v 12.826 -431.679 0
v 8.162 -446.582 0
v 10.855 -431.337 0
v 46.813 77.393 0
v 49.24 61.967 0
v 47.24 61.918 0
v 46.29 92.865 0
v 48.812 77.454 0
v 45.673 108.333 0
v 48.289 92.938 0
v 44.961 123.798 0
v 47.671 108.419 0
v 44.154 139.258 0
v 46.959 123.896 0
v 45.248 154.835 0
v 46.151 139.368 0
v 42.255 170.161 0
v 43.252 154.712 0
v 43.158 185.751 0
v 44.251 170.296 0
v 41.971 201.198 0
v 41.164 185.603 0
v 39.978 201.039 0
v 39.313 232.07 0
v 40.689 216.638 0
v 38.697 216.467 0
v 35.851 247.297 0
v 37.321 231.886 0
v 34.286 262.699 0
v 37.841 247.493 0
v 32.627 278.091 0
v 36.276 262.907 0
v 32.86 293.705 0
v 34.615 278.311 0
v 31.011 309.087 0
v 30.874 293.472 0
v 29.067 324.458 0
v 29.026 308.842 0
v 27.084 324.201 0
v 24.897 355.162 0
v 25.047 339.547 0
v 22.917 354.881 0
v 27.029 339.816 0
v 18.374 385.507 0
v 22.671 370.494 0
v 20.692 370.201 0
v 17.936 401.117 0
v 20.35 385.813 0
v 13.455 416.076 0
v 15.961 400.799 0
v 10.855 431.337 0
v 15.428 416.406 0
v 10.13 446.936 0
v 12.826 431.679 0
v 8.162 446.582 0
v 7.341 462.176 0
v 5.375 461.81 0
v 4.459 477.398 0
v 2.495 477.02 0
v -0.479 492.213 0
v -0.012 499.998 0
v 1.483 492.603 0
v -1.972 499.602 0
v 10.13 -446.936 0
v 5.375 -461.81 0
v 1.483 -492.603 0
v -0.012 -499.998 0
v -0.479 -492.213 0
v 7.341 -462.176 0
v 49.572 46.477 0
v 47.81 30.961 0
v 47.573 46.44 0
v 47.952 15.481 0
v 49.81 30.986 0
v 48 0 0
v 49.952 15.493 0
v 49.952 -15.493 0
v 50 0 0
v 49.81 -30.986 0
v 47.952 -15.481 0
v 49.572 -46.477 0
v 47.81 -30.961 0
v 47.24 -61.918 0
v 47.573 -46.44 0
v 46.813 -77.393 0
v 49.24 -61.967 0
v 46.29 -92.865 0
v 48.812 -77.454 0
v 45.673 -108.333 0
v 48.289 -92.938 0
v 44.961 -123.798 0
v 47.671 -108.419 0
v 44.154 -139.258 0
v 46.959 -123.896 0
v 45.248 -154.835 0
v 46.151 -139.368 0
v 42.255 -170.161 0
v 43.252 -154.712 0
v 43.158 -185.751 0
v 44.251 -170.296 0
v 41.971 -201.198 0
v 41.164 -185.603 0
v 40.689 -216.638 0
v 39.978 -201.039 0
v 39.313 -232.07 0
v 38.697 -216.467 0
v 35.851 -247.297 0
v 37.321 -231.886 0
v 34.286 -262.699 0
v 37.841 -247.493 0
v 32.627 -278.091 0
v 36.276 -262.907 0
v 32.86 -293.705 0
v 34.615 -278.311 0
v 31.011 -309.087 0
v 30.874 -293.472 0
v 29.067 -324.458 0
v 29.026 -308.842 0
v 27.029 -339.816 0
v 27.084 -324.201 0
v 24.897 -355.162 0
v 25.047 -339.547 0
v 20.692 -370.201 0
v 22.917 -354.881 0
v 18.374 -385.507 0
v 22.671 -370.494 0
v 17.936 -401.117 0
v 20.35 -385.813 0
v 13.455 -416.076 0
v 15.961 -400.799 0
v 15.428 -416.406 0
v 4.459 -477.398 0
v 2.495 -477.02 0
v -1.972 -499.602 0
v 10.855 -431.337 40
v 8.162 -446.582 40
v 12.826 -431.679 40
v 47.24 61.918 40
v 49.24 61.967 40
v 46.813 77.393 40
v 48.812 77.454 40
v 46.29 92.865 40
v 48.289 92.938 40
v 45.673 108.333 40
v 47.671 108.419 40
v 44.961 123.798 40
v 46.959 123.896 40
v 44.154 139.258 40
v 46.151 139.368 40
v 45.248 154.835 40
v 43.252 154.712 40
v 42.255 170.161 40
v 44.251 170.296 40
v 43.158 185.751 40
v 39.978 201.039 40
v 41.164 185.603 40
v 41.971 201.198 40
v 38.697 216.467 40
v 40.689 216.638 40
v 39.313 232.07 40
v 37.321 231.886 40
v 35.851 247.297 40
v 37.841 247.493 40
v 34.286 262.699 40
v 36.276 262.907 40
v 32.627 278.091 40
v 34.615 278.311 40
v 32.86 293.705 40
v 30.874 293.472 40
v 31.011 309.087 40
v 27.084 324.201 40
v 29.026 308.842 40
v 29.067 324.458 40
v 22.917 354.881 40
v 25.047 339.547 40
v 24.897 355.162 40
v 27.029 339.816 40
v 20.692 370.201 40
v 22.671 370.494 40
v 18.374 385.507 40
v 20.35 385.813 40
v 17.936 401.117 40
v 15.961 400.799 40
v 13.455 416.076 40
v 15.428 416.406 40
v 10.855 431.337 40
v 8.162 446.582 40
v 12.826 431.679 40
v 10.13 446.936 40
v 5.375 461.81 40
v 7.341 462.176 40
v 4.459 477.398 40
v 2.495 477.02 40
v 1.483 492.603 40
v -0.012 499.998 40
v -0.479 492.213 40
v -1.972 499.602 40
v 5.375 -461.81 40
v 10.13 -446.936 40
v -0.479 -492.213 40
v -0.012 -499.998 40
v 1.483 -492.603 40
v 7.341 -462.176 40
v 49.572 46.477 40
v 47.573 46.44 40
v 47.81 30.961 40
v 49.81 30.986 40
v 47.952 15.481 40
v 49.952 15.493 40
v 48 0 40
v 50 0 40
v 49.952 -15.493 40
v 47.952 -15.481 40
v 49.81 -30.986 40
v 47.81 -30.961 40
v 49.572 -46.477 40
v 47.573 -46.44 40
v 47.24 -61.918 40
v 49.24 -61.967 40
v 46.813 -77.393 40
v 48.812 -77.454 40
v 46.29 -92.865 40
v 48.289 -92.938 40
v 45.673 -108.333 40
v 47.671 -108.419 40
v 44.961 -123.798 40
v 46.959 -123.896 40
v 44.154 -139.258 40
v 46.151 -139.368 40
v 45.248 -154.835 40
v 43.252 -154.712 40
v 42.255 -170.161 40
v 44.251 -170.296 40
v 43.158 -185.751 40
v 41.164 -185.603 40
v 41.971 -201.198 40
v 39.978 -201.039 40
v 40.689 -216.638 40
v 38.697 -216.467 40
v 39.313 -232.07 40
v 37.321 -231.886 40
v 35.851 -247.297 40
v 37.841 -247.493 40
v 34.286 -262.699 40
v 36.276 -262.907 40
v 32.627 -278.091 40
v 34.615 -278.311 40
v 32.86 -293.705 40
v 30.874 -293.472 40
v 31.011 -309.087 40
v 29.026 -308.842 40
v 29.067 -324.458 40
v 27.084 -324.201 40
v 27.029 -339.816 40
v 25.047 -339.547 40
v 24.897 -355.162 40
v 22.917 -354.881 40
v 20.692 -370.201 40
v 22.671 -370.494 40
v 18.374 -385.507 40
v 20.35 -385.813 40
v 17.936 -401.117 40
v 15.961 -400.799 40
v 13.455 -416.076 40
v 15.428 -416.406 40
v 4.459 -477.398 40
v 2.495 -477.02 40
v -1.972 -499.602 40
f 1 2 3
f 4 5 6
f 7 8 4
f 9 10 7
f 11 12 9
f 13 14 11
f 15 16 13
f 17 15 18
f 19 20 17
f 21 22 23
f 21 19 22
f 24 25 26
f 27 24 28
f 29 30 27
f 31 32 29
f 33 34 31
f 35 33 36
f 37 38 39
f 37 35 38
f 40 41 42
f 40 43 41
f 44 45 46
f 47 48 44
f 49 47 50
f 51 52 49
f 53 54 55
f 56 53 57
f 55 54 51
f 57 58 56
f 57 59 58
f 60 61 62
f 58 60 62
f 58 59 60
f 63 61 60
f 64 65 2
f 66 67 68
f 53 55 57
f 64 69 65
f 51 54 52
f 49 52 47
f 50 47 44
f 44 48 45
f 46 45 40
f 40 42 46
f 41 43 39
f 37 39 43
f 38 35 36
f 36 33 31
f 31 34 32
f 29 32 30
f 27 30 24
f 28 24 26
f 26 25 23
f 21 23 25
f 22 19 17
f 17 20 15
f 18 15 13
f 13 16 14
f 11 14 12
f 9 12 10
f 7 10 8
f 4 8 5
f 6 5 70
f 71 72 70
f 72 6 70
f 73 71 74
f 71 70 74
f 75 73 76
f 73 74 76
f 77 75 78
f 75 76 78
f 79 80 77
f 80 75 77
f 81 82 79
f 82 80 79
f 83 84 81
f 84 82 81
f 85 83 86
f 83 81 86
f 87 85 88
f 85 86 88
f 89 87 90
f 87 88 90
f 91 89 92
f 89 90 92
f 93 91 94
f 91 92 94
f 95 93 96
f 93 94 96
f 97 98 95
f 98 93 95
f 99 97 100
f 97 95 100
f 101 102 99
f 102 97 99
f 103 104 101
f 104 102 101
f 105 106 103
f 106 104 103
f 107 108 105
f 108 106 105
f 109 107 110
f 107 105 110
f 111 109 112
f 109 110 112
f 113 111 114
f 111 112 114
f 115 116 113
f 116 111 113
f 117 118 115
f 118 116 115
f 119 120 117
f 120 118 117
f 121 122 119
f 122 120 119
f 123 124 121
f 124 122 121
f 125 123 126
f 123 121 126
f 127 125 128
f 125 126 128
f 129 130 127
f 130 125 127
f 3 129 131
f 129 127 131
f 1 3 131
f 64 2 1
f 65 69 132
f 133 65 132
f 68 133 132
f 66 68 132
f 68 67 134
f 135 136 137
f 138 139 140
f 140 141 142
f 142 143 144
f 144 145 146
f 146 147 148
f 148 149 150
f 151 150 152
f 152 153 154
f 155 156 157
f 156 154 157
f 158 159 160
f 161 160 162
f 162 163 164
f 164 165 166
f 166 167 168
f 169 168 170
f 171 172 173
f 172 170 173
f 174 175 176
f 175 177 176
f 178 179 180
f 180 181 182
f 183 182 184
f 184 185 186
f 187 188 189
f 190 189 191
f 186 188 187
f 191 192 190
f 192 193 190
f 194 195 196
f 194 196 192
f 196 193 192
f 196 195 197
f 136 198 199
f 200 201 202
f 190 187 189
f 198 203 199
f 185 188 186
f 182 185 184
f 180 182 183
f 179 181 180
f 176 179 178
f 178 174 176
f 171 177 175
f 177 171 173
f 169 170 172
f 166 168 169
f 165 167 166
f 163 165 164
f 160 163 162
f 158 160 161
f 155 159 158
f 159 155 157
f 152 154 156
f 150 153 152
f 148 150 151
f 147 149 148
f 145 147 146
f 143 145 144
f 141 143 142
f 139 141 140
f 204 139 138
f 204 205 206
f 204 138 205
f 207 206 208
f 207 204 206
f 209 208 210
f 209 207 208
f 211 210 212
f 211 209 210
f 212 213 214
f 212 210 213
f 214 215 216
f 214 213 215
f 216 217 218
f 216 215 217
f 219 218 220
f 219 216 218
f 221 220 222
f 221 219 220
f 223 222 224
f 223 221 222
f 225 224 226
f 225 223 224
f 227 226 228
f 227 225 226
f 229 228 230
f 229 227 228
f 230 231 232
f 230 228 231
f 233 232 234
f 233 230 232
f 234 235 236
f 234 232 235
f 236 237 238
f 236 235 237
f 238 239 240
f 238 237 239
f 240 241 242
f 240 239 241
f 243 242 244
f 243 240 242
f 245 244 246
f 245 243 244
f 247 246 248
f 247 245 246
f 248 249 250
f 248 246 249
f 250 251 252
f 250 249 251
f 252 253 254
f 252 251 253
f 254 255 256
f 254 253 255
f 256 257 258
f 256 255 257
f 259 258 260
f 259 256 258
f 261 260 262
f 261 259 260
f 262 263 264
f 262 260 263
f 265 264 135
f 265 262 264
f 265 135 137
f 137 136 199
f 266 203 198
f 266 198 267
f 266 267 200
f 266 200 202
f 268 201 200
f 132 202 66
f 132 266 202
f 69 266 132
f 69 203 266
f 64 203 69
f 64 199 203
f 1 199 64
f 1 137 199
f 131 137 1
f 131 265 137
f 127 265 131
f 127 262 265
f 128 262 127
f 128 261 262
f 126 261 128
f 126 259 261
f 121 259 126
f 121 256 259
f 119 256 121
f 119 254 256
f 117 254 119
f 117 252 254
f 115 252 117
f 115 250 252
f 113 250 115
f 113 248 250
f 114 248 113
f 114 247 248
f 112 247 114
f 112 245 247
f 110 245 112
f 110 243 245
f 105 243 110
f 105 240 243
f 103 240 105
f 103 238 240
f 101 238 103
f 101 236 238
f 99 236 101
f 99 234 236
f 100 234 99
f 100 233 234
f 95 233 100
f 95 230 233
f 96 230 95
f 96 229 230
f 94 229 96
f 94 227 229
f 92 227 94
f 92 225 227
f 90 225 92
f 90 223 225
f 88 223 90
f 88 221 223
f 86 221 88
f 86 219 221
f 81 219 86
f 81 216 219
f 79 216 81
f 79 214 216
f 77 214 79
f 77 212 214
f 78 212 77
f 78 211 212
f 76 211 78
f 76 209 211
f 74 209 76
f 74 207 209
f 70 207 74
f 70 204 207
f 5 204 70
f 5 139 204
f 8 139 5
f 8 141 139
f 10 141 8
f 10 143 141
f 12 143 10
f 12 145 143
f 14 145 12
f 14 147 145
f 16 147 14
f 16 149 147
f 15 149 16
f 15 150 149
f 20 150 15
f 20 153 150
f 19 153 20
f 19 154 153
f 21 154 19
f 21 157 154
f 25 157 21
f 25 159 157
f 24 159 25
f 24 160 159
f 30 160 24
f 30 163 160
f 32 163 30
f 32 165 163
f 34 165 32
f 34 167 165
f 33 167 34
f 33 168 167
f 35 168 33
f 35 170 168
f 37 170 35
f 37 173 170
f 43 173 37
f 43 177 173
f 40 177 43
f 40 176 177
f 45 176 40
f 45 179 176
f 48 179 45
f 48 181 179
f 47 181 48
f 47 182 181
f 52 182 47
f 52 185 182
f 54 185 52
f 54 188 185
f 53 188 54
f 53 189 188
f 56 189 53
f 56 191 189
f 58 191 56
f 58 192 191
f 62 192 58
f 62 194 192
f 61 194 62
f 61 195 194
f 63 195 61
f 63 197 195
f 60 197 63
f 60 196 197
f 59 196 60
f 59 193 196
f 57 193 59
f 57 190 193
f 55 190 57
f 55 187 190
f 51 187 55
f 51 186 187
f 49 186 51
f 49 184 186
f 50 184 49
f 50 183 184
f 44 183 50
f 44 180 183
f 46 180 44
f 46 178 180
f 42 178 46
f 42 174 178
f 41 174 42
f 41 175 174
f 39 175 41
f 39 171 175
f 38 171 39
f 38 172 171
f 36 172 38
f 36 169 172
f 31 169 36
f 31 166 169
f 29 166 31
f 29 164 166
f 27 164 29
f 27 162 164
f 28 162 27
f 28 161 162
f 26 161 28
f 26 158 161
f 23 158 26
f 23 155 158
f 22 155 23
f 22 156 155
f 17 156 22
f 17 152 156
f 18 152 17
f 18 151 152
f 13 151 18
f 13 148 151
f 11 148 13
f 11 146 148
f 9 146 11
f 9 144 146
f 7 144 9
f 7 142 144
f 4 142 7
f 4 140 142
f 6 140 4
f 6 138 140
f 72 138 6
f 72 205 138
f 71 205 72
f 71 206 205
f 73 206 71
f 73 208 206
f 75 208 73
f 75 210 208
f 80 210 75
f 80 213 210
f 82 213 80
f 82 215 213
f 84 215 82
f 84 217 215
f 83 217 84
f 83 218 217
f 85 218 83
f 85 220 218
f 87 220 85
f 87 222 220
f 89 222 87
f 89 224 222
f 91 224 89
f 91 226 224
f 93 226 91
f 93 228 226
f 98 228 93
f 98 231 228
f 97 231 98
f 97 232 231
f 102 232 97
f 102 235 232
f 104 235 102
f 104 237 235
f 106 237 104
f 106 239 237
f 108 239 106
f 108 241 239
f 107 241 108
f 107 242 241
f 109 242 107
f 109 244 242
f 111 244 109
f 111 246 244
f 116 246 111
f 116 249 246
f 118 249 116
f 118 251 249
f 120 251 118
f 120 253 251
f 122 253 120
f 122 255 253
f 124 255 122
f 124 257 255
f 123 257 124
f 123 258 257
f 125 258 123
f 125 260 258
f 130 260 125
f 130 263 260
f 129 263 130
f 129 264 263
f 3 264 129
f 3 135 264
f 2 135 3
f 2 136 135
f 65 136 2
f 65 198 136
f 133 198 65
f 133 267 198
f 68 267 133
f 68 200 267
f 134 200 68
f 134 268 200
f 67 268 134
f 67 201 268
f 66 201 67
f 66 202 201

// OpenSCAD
module sector(radius, angle, fn = 24) {
    r = radius / cos(180 / fn);
    step = -360 / fn;

    points = concat(
        [[0, 0]],
        [for(a = [-angle : step : +angle - 360])
            [r * cos(a), r * sin(a)]
        ],
        [[r * cos(angle), r * sin(angle)]]
    );

    difference() {
        circle(radius, $fn = fn);
        polygon(points);
    }
}


module arc(r1, r2, a1, a2) {
  difference() {
    difference() {
      polygon([[0,0], [cos(a1) * (r1 + 50), sin(a1) * (r1 + 50)], [cos(a2) * (r1 + 50), sin(a2) * (r1 + 50)]]);
      circle(r = r2);
    }
    difference() {
      circle(r=r1 + 100);
      circle(r=r1);
    }
  }
}


// for the doc, see docs/arc-length.odg
module meta_support_plate(x, D, thickness=2, plate_width, fn=48) {
    d = D / 2;
    r = (d^2 + x^2) / (2 * x);
    alpha = acos(1 - (x / r));
    L = 2 * alpha * r * PI / 180;
    echo("Metal support plate length (mm): ", L);
    echo("Angle (deg): ", alpha);

    color("gray")
    translate([-r+x, 0, 0])
    linear_extrude(plate_width) {
        difference() {
            sector(r, alpha, fn);
            sector(r-thickness, alpha+1, fn);
        }
    }

}


meta_support_plate(50, 1000, 2, 40, 1024);
